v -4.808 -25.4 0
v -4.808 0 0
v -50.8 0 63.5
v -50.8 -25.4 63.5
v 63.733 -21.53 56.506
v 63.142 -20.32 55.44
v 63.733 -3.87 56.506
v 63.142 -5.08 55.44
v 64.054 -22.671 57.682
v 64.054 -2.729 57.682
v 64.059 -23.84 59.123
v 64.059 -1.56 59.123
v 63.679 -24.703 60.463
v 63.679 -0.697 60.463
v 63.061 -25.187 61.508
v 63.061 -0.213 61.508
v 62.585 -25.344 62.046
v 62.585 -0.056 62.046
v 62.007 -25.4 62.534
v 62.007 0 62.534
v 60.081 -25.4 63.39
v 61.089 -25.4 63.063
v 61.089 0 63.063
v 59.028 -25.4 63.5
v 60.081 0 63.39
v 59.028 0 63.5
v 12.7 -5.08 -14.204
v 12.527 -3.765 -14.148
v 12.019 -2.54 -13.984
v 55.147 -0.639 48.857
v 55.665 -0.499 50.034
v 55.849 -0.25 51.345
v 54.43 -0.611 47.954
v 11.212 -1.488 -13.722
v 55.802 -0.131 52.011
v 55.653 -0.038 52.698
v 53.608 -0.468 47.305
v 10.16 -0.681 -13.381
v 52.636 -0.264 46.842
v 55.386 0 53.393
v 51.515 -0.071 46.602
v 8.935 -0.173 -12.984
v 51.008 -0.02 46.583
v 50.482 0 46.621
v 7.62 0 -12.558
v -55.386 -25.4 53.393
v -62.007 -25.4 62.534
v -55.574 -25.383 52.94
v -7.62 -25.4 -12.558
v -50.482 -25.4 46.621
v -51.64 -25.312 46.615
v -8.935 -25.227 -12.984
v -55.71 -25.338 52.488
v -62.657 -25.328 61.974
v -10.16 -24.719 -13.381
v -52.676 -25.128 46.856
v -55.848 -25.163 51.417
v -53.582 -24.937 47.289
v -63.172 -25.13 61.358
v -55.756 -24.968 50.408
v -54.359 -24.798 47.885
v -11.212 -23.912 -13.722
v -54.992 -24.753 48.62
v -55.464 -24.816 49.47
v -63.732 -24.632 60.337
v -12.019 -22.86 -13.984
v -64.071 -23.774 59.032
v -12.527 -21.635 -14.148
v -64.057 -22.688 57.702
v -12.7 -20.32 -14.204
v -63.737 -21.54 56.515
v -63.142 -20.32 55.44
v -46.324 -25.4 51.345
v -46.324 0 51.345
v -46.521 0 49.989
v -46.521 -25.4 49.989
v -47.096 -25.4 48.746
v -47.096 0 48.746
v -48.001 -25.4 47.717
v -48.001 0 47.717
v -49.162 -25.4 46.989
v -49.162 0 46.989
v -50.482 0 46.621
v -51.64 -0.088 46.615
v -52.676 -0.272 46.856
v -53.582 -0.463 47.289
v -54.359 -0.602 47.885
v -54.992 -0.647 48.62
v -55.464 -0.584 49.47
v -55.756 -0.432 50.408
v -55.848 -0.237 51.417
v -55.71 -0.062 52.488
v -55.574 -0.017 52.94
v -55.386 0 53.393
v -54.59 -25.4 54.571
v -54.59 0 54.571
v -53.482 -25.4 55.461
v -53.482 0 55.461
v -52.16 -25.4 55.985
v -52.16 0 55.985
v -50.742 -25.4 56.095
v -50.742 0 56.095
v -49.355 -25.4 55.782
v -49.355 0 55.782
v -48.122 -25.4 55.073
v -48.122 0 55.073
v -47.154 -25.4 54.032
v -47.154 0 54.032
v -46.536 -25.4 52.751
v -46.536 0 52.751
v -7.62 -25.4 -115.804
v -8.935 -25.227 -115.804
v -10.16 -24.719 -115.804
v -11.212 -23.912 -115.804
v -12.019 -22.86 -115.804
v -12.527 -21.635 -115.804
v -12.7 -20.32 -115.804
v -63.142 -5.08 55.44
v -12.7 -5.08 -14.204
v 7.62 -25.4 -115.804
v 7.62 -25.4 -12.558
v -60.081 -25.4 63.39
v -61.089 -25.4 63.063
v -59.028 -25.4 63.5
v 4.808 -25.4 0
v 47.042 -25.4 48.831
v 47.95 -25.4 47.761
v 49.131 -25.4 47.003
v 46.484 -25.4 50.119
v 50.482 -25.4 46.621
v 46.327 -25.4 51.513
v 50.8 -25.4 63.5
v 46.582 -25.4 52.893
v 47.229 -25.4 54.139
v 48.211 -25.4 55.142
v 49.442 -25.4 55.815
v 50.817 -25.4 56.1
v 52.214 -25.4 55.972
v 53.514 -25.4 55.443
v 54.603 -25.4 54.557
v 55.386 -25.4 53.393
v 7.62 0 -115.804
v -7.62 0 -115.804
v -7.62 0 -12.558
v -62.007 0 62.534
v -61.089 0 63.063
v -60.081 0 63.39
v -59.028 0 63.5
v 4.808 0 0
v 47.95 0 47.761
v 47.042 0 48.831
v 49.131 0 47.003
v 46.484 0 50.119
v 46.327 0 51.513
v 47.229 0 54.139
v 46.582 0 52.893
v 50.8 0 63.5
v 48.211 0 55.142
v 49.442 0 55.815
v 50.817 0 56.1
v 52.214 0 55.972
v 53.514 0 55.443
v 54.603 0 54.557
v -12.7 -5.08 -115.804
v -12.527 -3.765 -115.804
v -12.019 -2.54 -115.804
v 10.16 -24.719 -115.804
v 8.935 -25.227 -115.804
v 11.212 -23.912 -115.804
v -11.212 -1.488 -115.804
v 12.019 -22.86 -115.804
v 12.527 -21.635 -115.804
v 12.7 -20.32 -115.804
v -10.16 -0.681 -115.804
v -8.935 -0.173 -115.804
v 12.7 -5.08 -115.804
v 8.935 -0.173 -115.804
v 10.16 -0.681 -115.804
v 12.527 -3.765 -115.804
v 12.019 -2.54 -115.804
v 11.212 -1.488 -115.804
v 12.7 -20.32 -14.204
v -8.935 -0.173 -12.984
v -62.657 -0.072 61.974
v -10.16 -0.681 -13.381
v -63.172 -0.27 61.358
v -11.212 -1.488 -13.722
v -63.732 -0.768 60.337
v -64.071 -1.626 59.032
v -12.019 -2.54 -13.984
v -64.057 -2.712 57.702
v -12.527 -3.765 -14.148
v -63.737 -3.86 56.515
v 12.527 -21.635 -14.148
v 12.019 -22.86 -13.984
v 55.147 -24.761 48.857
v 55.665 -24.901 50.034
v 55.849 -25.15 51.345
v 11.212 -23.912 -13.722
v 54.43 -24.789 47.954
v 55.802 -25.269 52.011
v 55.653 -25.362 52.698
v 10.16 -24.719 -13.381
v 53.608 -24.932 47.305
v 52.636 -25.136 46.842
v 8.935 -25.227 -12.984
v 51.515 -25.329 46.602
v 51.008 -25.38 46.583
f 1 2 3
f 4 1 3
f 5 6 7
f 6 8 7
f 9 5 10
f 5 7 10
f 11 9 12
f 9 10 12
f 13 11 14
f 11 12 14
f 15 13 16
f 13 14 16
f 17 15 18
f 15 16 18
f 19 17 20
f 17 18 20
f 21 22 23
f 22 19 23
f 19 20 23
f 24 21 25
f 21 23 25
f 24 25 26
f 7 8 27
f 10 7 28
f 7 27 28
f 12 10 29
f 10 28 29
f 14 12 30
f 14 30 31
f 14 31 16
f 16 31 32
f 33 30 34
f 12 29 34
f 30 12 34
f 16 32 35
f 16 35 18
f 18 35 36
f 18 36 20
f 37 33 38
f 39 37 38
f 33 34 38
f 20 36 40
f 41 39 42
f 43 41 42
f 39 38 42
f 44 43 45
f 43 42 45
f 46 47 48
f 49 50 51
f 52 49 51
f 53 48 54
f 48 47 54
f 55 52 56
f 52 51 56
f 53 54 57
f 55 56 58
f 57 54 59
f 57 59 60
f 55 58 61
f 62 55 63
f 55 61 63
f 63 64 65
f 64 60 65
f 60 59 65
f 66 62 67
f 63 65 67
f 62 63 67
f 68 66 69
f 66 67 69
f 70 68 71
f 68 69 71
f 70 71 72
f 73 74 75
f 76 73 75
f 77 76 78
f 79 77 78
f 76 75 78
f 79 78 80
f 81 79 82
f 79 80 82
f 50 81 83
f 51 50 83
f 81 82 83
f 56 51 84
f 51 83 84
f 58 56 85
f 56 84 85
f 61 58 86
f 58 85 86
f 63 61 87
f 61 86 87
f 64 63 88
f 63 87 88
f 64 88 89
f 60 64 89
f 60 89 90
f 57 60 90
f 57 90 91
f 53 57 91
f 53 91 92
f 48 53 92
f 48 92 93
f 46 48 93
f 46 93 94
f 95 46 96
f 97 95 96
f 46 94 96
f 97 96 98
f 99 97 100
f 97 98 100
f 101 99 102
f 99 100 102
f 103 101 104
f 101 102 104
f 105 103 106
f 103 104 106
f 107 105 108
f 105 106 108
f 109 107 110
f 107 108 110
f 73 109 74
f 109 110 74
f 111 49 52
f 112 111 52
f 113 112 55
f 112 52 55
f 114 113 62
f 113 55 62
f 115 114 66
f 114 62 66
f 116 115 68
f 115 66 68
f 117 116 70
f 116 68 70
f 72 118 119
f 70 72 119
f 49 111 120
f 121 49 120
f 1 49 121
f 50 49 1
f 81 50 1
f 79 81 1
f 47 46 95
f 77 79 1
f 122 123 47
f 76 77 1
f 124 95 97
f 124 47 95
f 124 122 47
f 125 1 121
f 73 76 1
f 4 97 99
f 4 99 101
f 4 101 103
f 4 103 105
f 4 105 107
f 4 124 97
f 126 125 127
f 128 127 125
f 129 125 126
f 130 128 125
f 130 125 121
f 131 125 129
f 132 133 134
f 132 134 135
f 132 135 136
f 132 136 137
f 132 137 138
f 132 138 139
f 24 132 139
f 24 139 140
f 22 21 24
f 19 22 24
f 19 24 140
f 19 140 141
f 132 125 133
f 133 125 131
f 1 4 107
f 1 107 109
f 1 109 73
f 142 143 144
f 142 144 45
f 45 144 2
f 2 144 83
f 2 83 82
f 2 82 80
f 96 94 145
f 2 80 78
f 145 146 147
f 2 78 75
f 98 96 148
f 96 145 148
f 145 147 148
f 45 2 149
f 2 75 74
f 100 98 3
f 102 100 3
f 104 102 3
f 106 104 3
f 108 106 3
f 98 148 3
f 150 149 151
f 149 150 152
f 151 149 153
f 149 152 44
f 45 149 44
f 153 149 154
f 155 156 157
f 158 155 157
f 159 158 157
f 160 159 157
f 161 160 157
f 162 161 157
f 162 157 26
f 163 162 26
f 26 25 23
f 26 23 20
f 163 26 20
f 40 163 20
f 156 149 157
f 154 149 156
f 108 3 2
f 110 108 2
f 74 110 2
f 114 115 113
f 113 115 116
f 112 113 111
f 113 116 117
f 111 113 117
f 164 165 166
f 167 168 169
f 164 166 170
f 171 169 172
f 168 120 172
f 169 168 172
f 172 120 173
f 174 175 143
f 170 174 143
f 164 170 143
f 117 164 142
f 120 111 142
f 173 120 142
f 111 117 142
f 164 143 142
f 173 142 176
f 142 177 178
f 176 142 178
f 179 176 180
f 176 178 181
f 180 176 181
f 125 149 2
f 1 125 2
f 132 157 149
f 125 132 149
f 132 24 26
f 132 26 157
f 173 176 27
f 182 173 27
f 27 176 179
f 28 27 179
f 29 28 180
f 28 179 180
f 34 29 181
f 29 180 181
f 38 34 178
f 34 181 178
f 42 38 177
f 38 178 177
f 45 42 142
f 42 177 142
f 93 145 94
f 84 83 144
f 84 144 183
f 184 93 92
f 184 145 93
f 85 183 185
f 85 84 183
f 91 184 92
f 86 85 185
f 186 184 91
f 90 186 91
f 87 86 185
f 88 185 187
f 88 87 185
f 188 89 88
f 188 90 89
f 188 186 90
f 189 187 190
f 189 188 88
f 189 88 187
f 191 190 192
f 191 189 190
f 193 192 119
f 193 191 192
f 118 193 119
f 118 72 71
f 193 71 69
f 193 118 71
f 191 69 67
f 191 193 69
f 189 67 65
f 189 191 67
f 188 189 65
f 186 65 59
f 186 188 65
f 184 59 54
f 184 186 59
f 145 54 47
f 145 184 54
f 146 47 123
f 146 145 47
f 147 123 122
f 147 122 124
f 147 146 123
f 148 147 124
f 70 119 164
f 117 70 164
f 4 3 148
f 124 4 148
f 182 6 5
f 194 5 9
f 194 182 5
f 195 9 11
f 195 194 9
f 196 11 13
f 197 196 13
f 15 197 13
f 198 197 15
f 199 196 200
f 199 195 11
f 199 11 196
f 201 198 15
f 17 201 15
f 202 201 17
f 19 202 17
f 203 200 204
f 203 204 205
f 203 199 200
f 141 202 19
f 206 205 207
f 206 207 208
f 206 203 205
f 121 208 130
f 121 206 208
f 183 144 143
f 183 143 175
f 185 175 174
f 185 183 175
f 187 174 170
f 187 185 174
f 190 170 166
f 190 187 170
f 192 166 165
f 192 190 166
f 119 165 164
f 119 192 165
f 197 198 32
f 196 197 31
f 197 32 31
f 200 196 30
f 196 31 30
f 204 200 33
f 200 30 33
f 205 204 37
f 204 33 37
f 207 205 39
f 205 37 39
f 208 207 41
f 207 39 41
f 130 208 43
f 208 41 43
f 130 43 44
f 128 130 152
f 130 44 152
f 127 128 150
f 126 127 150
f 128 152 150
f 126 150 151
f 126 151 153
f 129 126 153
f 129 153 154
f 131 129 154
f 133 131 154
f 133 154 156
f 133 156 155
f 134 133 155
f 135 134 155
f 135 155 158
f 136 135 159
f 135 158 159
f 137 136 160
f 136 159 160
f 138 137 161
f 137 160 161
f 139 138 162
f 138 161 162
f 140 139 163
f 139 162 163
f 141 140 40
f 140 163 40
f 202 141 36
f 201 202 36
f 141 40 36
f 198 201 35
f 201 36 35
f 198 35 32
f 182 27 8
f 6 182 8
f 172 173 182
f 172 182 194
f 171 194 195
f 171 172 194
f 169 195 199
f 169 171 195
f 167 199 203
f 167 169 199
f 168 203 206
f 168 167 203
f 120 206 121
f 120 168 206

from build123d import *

# Parameters (mm, degrees)
F1_DEPTH     = 25.4
F3_DEPTH     = 25.401
F4_T1_DEPTH  = 75.1590131963
F4_T6_DEPTH  = 127
F4_T11_DEPTH = 127
F4_T16_DEPTH = 127
F4_T21_DEPTH = 127
F4_T26_DEPTH = 121.344223221
F4_T31_DEPTH = 121.344223221
F4_T36_DEPTH = 121.344223221
F4_T41_DEPTH = 121.344223221
F4_T47_DEPTH = 121.344223221
F4_T51_DEPTH = 127
F4_T58_DEPTH = 127
F4_T62_DEPTH = 121.344223221
F4_T69_DEPTH = 121.344223221
F4_T73_DEPTH = 127
F4_T80_DEPTH = 127
F4_T84_DEPTH = 121.344223221


# Not quite as in the source:
# - a fillet or chamfer that OpenCascade refuses, or shapes differently, is made with other operations: its cross-section is extruded or revolved along the edge and cut away or added


with BuildPart() as f1:
    # F0 (on Front) → F1 (new body)
    with BuildSketch(Plane.XZ):
        Polygon((4.8083475167, 0), (0, 0), (-4.8083475167, 0), (-50.8, 63.5), (-68.9793676138, 63.5), (-12.7, -14.2040973853), (-12.7, -115.8040973853), (0, -115.8040973853), (12.7, -115.8040973853), (12.7, -14.2040973853), (68.9793676138, 63.5), (50.8, 63.5), align=None)
    extrude(amount=F1_DEPTH)

    # F2 (on face) → F3 (cut, through all)
    with BuildSketch(Plane(origin=(0, 0, 0), x_dir=(-1, 0, 0), z_dir=(0, 1, 0))):
        with BuildLine():
            ThreePointArc((-46.3238090676, 51.3453096211), (-51.0863090676, 56.1078096211), (-55.8488090676, 51.3453096211))
            Line((-55.8488090676, 51.3453096211), (-46.3238090676, 51.3453096211))
        make_face()
        with BuildLine():
            Line((-46.3238090676, 51.3453096211), (-55.8488090676, 51.3453096211))
            ThreePointArc((-55.8488090676, 51.3453096211), (-51.0863090676, 46.5828096211), (-46.3238090676, 51.3453096211))
        make_face()
        with BuildLine():
            ThreePointArc((55.8488090676, 51.3453096211), (51.0863090676, 56.1078096211), (46.3238090676, 51.3453096211))
            Line((46.3238090676, 51.3453096211), (55.8488090676, 51.3453096211))
        make_face()
        with BuildLine():
            Line((55.8488090676, 51.3453096211), (46.3238090676, 51.3453096211))
            ThreePointArc((46.3238090676, 51.3453096211), (51.0863090676, 46.5828096211), (55.8488090676, 51.3453096211))
        make_face()
    extrude(amount=-F3_DEPTH, mode=Mode.SUBTRACT)

    # F4: fillet of radius 5.08 on 10 edges, made by hand

    # F4_s2 → F4_t1 (cut)
    with BuildSketch(Plane.XZ.offset(-24.8795065982)):
        with BuildLine():
            ThreePointArc((-63.1417971968, 55.440152148), (-63.552165901, 60.7296290732), (-59.0275649745, 63.5))
            Line((-59.0275649745, 63.5), (-68.9793676138, 63.5))
            Line((-68.9793676138, 63.5), (-63.1417971968, 55.440152148))
        make_face()
        with BuildLine():
            ThreePointArc((63.1417971968, 55.440152148), (63.552165901, 60.7296290732), (59.0275649745, 63.5))
            Line((59.0275649745, 63.5), (68.9793676138, 63.5))
            Line((68.9793676138, 63.5), (63.1417971968, 55.440152148))
        make_face()
    extrude(amount=F4_T1_DEPTH, mode=Mode.SUBTRACT)


with BuildPart() as f4_tool4:
    # F4_s5 → F4_t6 (new body)
    with BuildSketch(Plane.XY.offset(-128.5040973853)):
        with BuildLine():
            ThreePointArc((12.7, -5.08), (11.2121024484, -1.4878975516), (7.62, 0))
            Line((7.62, 0), (12.7, 0))
            Line((12.7, 0), (12.7, -5.08))
        make_face()
    extrude(amount=F4_T6_DEPTH)

    split(bisect_by=Plane(origin=(15.0780779602, 0, -10.9207200262), x_dir=(0, 1, 0), z_dir=(0.8098882327, 0, -0.5865842228)), keep=Keep.TOP)


with BuildPart() as f1_1:
    add(f1.part)

    # F4_t3: cut F4_tool4
    add(f4_tool4.part, mode=Mode.SUBTRACT)


with BuildPart() as f4_tool9:
    # F4_s10 → F4_t11 (new body)
    with BuildSketch(Plane.XY.offset(-1.5040973853)):
        with BuildLine():
            ThreePointArc((-7.62, 0), (-11.2121024484, -1.4878975516), (-12.7, -5.08))
            Line((-12.7, -5.08), (-12.7, 0))
            Line((-12.7, 0), (-7.62, 0))
        make_face()
    extrude(amount=-F4_T11_DEPTH)

    split(bisect_by=Plane(origin=(-15.0780779602, 0, -10.9207200262), x_dir=(0, 1, 0), z_dir=(-0.8098882327, 0, -0.5865842228)), keep=Keep.TOP)


with BuildPart() as f1_2:
    add(f1_1.part)

    # F4_t8: cut F4_tool9
    add(f4_tool9.part, mode=Mode.SUBTRACT)


with BuildPart() as f4_tool14:
    # F4_s15 → F4_t16 (new body)
    with BuildSketch(Plane.XY.offset(-128.5040973853)):
        with BuildLine():
            ThreePointArc((12.7, -20.32), (11.2121024484, -23.9121024484), (7.62, -25.4))
            Line((7.62, -25.4), (12.7, -25.4))
            Line((12.7, -25.4), (12.7, -20.32))
        make_face()
    extrude(amount=F4_T16_DEPTH)

    split(bisect_by=Plane(origin=(15.0780779602, 0, -10.9207200262), x_dir=(0, 1, 0), z_dir=(0.8098882327, 0, -0.5865842228)), keep=Keep.TOP)


with BuildPart() as f1_3:
    add(f1_2.part)

    # F4_t13: cut F4_tool14
    add(f4_tool14.part, mode=Mode.SUBTRACT)


with BuildPart() as f4_tool19:
    # F4_s20 → F4_t21 (new body)
    with BuildSketch(Plane.XY.offset(-1.5040973853)):
        with BuildLine():
            ThreePointArc((-7.62, -25.4), (-11.2121024484, -23.9121024484), (-12.7, -20.32))
            Line((-12.7, -20.32), (-12.7, -25.4))
            Line((-12.7, -25.4), (-7.62, -25.4))
        make_face()
    extrude(amount=-F4_T21_DEPTH)

    split(bisect_by=Plane(origin=(-15.0780779602, 0, -10.9207200262), x_dir=(0, 1, 0), z_dir=(-0.8098882327, 0, -0.5865842228)), keep=Keep.TOP)


with BuildPart() as f1_4:
    add(f1_3.part)

    # F4_t18: cut F4_tool19
    add(f4_tool19.part, mode=Mode.SUBTRACT)


with BuildPart() as f4_tool24:
    # F4_s25 → F4_t26 (new body)
    with BuildSketch(Plane(origin=(-9.8276975902, 0, -13.5689579148), x_dir=(0, 1, 0), z_dir=(0.5865842228, 0, 0.8098882327))):
        with BuildLine():
            ThreePointArc((-20.32, -18.6174799816), (-23.9121024484, -17.12958243), (-25.4, -13.5374799816))
            Line((-25.4, -13.5374799816), (-25.4, -18.6174799816))
            Line((-25.4, -18.6174799816), (-20.32, -18.6174799816))
        make_face()
    extrude(amount=F4_T26_DEPTH)

    split(bisect_by=Plane.YZ.offset(12.7), keep=Keep.TOP)


with BuildPart() as f1_5:
    add(f1_4.part)

    # F4_t23: cut F4_tool24
    add(f4_tool24.part, mode=Mode.SUBTRACT)


with BuildPart() as f4_tool29:
    # F4_s30 → F4_t31 (new body)
    with BuildSketch(Plane(origin=(-9.8276975902, 0, -13.5689579148), x_dir=(0, 1, 0), z_dir=(0.5865842228, 0, 0.8098882327))):
        with BuildLine():
            ThreePointArc((-5.08, -18.6174799816), (-1.4878975516, -17.12958243), (0, -13.5374799816))
            Line((0, -13.5374799816), (0, -18.6174799816))
            Line((0, -18.6174799816), (-5.08, -18.6174799816))
        make_face()
    extrude(amount=F4_T31_DEPTH)

    split(bisect_by=Plane.YZ.offset(12.7), keep=Keep.TOP)


with BuildPart() as f1_6:
    add(f1_5.part)

    # F4_t28: cut F4_tool29
    add(f4_tool29.part, mode=Mode.SUBTRACT)


with BuildPart() as f4_tool34:
    # F4_s35 → F4_t36 (new body)
    with BuildSketch(Plane(origin=(-61.3509092836, 0, 84.7063005819), x_dir=(0, 1, 0), z_dir=(0.5865842228, 0, -0.8098882327))):
        with BuildLine():
            ThreePointArc((-25.4, -13.5374799816), (-23.9121024484, -17.12958243), (-20.32, -18.6174799816))
            Line((-20.32, -18.6174799816), (-25.4, -18.6174799816))
            Line((-25.4, -18.6174799816), (-25.4, -13.5374799816))
        make_face()
    extrude(amount=F4_T36_DEPTH)

    split(bisect_by=Plane.YZ.offset(-12.7), keep=Keep.BOTTOM)


with BuildPart() as f1_7:
    add(f1_6.part)

    # F4_t33: cut F4_tool34
    add(f4_tool34.part, mode=Mode.SUBTRACT)


with BuildPart() as f4_tool39:
    # F4_s40 → F4_t41 (new body)
    with BuildSketch(Plane(origin=(-61.3509092836, 0, 84.7063005819), x_dir=(0, 1, 0), z_dir=(0.5865842228, 0, -0.8098882327))):
        with BuildLine():
            ThreePointArc((0, -13.5374799816), (-1.4878975516, -17.12958243), (-5.08, -18.6174799816))
            Line((-5.08, -18.6174799816), (0, -18.6174799816))
            Line((0, -18.6174799816), (0, -13.5374799816))
        make_face()
    extrude(amount=F4_T41_DEPTH)

    split(bisect_by=Plane.YZ.offset(-12.7), keep=Keep.BOTTOM)


with BuildPart() as f1_8:
    add(f1_7.part)

    # F4_t38: cut F4_tool39
    add(f4_tool39.part, mode=Mode.SUBTRACT)


with BuildPart() as f4_tool45:
    # F4_s46 → F4_t47 (new body)
    with BuildSketch(Plane(origin=(-9.8276975902, 0, -13.5689579148), x_dir=(0, 1, 0), z_dir=(0.5865842228, 0, 0.8098882327))):
        with BuildLine():
            ThreePointArc((-5.08, -18.6174799816), (-1.4878975516, -17.12958243), (0, -13.5374799816))
            Line((0, -13.5374799816), (0, -18.6174799816))
            Line((0, -18.6174799816), (-5.08, -18.6174799816))
        make_face()
    extrude(amount=F4_T47_DEPTH)

    split(bisect_by=Plane.YZ.offset(12.7), keep=Keep.BOTTOM)


with BuildPart() as f4_tool49:
    # F4_s50 → F4_t51 (new body)
    with BuildSketch(Plane.XY.offset(-128.5040973853)):
        with BuildLine():
            ThreePointArc((12.7, -5.08), (11.2121024484, -1.4878975516), (7.62, 0))
            Line((7.62, 0), (12.7, 0))
            Line((12.7, 0), (12.7, -5.08))
        make_face()
    extrude(amount=F4_T51_DEPTH)

    split(bisect_by=Plane(origin=(15.0780779602, 0, -10.9207200262), x_dir=(0, 1, 0), z_dir=(-0.8098882327, 0, 0.5865842228)), keep=Keep.TOP)


with BuildPart() as f4_tool45_1:
    add(f4_tool45.part)

    # F4_t53: intersect F4_tool49
    add(f4_tool49.part, mode=Mode.INTERSECT)


with BuildPart() as f1_9:
    add(f1_8.part)

    # F4_t43: cut F4_tool45
    add(f4_tool45_1.part, mode=Mode.SUBTRACT)


with BuildPart() as f4_tool56:
    # F4_s57 → F4_t58 (new body)
    with BuildSketch(Plane.XY.offset(-1.5040973853)):
        with BuildLine():
            ThreePointArc((-7.62, 0), (-11.2121024484, -1.4878975516), (-12.7, -5.08))
            Line((-12.7, -5.08), (-12.7, 0))
            Line((-12.7, 0), (-7.62, 0))
        make_face()
    extrude(amount=-F4_T58_DEPTH)

    split(bisect_by=Plane(origin=(-15.0780779602, 0, -10.9207200262), x_dir=(0, 1, 0), z_dir=(0.8098882327, 0, 0.5865842228)), keep=Keep.TOP)


with BuildPart() as f4_tool60:
    # F4_s61 → F4_t62 (new body)
    with BuildSketch(Plane(origin=(-61.3509092836, 0, 84.7063005819), x_dir=(0, 1, 0), z_dir=(0.5865842228, 0, -0.8098882327))):
        with BuildLine():
            ThreePointArc((0, -13.5374799816), (-1.4878975516, -17.12958243), (-5.08, -18.6174799816))
            Line((-5.08, -18.6174799816), (0, -18.6174799816))
            Line((0, -18.6174799816), (0, -13.5374799816))
        make_face()
    extrude(amount=F4_T62_DEPTH)

    split(bisect_by=Plane.YZ.offset(-12.7), keep=Keep.TOP)


with BuildPart() as f4_tool56_1:
    add(f4_tool56.part)

    # F4_t64: intersect F4_tool60
    add(f4_tool60.part, mode=Mode.INTERSECT)


with BuildPart() as f1_10:
    add(f1_9.part)

    # F4_t54: cut F4_tool56
    add(f4_tool56_1.part, mode=Mode.SUBTRACT)


with BuildPart() as f4_tool67:
    # F4_s68 → F4_t69 (new body)
    with BuildSketch(Plane(origin=(-9.8276975902, 0, -13.5689579148), x_dir=(0, 1, 0), z_dir=(0.5865842228, 0, 0.8098882327))):
        with BuildLine():
            ThreePointArc((-20.32, -18.6174799816), (-23.9121024484, -17.12958243), (-25.4, -13.5374799816))
            Line((-25.4, -13.5374799816), (-25.4, -18.6174799816))
            Line((-25.4, -18.6174799816), (-20.32, -18.6174799816))
        make_face()
    extrude(amount=F4_T69_DEPTH)

    split(bisect_by=Plane.YZ.offset(12.7), keep=Keep.BOTTOM)


with BuildPart() as f4_tool71:
    # F4_s72 → F4_t73 (new body)
    with BuildSketch(Plane.XY.offset(-128.5040973853)):
        with BuildLine():
            ThreePointArc((12.7, -20.32), (11.2121024484, -23.9121024484), (7.62, -25.4))
            Line((7.62, -25.4), (12.7, -25.4))
            Line((12.7, -25.4), (12.7, -20.32))
        make_face()
    extrude(amount=F4_T73_DEPTH)

    split(bisect_by=Plane(origin=(15.0780779602, 0, -10.9207200262), x_dir=(0, 1, 0), z_dir=(-0.8098882327, 0, 0.5865842228)), keep=Keep.TOP)


with BuildPart() as f4_tool67_1:
    add(f4_tool67.part)

    # F4_t75: intersect F4_tool71
    add(f4_tool71.part, mode=Mode.INTERSECT)


with BuildPart() as f1_11:
    add(f1_10.part)

    # F4_t65: cut F4_tool67
    add(f4_tool67_1.part, mode=Mode.SUBTRACT)


with BuildPart() as f4_tool78:
    # F4_s79 → F4_t80 (new body)
    with BuildSketch(Plane.XY.offset(-1.5040973853)):
        with BuildLine():
            ThreePointArc((-7.62, -25.4), (-11.2121024484, -23.9121024484), (-12.7, -20.32))
            Line((-12.7, -20.32), (-12.7, -25.4))
            Line((-12.7, -25.4), (-7.62, -25.4))
        make_face()
    extrude(amount=-F4_T80_DEPTH)

    split(bisect_by=Plane(origin=(-15.0780779602, 0, -10.9207200262), x_dir=(0, 1, 0), z_dir=(0.8098882327, 0, 0.5865842228)), keep=Keep.TOP)


with BuildPart() as f4_tool82:
    # F4_s83 → F4_t84 (new body)
    with BuildSketch(Plane(origin=(-61.3509092836, 0, 84.7063005819), x_dir=(0, 1, 0), z_dir=(0.5865842228, 0, -0.8098882327))):
        with BuildLine():
            ThreePointArc((-25.4, -13.5374799816), (-23.9121024484, -17.12958243), (-20.32, -18.6174799816))
            Line((-20.32, -18.6174799816), (-25.4, -18.6174799816))
            Line((-25.4, -18.6174799816), (-25.4, -13.5374799816))
        make_face()
    extrude(amount=F4_T84_DEPTH)

    split(bisect_by=Plane.YZ.offset(-12.7), keep=Keep.TOP)


with BuildPart() as f4_tool78_1:
    add(f4_tool78.part)

    # F4_t86: intersect F4_tool82
    add(f4_tool82.part, mode=Mode.INTERSECT)


with BuildPart() as f1_12:
    add(f1_11.part)

    # F4_t76: cut F4_tool78
    add(f4_tool78_1.part, mode=Mode.SUBTRACT)


solid = f1_12.part
